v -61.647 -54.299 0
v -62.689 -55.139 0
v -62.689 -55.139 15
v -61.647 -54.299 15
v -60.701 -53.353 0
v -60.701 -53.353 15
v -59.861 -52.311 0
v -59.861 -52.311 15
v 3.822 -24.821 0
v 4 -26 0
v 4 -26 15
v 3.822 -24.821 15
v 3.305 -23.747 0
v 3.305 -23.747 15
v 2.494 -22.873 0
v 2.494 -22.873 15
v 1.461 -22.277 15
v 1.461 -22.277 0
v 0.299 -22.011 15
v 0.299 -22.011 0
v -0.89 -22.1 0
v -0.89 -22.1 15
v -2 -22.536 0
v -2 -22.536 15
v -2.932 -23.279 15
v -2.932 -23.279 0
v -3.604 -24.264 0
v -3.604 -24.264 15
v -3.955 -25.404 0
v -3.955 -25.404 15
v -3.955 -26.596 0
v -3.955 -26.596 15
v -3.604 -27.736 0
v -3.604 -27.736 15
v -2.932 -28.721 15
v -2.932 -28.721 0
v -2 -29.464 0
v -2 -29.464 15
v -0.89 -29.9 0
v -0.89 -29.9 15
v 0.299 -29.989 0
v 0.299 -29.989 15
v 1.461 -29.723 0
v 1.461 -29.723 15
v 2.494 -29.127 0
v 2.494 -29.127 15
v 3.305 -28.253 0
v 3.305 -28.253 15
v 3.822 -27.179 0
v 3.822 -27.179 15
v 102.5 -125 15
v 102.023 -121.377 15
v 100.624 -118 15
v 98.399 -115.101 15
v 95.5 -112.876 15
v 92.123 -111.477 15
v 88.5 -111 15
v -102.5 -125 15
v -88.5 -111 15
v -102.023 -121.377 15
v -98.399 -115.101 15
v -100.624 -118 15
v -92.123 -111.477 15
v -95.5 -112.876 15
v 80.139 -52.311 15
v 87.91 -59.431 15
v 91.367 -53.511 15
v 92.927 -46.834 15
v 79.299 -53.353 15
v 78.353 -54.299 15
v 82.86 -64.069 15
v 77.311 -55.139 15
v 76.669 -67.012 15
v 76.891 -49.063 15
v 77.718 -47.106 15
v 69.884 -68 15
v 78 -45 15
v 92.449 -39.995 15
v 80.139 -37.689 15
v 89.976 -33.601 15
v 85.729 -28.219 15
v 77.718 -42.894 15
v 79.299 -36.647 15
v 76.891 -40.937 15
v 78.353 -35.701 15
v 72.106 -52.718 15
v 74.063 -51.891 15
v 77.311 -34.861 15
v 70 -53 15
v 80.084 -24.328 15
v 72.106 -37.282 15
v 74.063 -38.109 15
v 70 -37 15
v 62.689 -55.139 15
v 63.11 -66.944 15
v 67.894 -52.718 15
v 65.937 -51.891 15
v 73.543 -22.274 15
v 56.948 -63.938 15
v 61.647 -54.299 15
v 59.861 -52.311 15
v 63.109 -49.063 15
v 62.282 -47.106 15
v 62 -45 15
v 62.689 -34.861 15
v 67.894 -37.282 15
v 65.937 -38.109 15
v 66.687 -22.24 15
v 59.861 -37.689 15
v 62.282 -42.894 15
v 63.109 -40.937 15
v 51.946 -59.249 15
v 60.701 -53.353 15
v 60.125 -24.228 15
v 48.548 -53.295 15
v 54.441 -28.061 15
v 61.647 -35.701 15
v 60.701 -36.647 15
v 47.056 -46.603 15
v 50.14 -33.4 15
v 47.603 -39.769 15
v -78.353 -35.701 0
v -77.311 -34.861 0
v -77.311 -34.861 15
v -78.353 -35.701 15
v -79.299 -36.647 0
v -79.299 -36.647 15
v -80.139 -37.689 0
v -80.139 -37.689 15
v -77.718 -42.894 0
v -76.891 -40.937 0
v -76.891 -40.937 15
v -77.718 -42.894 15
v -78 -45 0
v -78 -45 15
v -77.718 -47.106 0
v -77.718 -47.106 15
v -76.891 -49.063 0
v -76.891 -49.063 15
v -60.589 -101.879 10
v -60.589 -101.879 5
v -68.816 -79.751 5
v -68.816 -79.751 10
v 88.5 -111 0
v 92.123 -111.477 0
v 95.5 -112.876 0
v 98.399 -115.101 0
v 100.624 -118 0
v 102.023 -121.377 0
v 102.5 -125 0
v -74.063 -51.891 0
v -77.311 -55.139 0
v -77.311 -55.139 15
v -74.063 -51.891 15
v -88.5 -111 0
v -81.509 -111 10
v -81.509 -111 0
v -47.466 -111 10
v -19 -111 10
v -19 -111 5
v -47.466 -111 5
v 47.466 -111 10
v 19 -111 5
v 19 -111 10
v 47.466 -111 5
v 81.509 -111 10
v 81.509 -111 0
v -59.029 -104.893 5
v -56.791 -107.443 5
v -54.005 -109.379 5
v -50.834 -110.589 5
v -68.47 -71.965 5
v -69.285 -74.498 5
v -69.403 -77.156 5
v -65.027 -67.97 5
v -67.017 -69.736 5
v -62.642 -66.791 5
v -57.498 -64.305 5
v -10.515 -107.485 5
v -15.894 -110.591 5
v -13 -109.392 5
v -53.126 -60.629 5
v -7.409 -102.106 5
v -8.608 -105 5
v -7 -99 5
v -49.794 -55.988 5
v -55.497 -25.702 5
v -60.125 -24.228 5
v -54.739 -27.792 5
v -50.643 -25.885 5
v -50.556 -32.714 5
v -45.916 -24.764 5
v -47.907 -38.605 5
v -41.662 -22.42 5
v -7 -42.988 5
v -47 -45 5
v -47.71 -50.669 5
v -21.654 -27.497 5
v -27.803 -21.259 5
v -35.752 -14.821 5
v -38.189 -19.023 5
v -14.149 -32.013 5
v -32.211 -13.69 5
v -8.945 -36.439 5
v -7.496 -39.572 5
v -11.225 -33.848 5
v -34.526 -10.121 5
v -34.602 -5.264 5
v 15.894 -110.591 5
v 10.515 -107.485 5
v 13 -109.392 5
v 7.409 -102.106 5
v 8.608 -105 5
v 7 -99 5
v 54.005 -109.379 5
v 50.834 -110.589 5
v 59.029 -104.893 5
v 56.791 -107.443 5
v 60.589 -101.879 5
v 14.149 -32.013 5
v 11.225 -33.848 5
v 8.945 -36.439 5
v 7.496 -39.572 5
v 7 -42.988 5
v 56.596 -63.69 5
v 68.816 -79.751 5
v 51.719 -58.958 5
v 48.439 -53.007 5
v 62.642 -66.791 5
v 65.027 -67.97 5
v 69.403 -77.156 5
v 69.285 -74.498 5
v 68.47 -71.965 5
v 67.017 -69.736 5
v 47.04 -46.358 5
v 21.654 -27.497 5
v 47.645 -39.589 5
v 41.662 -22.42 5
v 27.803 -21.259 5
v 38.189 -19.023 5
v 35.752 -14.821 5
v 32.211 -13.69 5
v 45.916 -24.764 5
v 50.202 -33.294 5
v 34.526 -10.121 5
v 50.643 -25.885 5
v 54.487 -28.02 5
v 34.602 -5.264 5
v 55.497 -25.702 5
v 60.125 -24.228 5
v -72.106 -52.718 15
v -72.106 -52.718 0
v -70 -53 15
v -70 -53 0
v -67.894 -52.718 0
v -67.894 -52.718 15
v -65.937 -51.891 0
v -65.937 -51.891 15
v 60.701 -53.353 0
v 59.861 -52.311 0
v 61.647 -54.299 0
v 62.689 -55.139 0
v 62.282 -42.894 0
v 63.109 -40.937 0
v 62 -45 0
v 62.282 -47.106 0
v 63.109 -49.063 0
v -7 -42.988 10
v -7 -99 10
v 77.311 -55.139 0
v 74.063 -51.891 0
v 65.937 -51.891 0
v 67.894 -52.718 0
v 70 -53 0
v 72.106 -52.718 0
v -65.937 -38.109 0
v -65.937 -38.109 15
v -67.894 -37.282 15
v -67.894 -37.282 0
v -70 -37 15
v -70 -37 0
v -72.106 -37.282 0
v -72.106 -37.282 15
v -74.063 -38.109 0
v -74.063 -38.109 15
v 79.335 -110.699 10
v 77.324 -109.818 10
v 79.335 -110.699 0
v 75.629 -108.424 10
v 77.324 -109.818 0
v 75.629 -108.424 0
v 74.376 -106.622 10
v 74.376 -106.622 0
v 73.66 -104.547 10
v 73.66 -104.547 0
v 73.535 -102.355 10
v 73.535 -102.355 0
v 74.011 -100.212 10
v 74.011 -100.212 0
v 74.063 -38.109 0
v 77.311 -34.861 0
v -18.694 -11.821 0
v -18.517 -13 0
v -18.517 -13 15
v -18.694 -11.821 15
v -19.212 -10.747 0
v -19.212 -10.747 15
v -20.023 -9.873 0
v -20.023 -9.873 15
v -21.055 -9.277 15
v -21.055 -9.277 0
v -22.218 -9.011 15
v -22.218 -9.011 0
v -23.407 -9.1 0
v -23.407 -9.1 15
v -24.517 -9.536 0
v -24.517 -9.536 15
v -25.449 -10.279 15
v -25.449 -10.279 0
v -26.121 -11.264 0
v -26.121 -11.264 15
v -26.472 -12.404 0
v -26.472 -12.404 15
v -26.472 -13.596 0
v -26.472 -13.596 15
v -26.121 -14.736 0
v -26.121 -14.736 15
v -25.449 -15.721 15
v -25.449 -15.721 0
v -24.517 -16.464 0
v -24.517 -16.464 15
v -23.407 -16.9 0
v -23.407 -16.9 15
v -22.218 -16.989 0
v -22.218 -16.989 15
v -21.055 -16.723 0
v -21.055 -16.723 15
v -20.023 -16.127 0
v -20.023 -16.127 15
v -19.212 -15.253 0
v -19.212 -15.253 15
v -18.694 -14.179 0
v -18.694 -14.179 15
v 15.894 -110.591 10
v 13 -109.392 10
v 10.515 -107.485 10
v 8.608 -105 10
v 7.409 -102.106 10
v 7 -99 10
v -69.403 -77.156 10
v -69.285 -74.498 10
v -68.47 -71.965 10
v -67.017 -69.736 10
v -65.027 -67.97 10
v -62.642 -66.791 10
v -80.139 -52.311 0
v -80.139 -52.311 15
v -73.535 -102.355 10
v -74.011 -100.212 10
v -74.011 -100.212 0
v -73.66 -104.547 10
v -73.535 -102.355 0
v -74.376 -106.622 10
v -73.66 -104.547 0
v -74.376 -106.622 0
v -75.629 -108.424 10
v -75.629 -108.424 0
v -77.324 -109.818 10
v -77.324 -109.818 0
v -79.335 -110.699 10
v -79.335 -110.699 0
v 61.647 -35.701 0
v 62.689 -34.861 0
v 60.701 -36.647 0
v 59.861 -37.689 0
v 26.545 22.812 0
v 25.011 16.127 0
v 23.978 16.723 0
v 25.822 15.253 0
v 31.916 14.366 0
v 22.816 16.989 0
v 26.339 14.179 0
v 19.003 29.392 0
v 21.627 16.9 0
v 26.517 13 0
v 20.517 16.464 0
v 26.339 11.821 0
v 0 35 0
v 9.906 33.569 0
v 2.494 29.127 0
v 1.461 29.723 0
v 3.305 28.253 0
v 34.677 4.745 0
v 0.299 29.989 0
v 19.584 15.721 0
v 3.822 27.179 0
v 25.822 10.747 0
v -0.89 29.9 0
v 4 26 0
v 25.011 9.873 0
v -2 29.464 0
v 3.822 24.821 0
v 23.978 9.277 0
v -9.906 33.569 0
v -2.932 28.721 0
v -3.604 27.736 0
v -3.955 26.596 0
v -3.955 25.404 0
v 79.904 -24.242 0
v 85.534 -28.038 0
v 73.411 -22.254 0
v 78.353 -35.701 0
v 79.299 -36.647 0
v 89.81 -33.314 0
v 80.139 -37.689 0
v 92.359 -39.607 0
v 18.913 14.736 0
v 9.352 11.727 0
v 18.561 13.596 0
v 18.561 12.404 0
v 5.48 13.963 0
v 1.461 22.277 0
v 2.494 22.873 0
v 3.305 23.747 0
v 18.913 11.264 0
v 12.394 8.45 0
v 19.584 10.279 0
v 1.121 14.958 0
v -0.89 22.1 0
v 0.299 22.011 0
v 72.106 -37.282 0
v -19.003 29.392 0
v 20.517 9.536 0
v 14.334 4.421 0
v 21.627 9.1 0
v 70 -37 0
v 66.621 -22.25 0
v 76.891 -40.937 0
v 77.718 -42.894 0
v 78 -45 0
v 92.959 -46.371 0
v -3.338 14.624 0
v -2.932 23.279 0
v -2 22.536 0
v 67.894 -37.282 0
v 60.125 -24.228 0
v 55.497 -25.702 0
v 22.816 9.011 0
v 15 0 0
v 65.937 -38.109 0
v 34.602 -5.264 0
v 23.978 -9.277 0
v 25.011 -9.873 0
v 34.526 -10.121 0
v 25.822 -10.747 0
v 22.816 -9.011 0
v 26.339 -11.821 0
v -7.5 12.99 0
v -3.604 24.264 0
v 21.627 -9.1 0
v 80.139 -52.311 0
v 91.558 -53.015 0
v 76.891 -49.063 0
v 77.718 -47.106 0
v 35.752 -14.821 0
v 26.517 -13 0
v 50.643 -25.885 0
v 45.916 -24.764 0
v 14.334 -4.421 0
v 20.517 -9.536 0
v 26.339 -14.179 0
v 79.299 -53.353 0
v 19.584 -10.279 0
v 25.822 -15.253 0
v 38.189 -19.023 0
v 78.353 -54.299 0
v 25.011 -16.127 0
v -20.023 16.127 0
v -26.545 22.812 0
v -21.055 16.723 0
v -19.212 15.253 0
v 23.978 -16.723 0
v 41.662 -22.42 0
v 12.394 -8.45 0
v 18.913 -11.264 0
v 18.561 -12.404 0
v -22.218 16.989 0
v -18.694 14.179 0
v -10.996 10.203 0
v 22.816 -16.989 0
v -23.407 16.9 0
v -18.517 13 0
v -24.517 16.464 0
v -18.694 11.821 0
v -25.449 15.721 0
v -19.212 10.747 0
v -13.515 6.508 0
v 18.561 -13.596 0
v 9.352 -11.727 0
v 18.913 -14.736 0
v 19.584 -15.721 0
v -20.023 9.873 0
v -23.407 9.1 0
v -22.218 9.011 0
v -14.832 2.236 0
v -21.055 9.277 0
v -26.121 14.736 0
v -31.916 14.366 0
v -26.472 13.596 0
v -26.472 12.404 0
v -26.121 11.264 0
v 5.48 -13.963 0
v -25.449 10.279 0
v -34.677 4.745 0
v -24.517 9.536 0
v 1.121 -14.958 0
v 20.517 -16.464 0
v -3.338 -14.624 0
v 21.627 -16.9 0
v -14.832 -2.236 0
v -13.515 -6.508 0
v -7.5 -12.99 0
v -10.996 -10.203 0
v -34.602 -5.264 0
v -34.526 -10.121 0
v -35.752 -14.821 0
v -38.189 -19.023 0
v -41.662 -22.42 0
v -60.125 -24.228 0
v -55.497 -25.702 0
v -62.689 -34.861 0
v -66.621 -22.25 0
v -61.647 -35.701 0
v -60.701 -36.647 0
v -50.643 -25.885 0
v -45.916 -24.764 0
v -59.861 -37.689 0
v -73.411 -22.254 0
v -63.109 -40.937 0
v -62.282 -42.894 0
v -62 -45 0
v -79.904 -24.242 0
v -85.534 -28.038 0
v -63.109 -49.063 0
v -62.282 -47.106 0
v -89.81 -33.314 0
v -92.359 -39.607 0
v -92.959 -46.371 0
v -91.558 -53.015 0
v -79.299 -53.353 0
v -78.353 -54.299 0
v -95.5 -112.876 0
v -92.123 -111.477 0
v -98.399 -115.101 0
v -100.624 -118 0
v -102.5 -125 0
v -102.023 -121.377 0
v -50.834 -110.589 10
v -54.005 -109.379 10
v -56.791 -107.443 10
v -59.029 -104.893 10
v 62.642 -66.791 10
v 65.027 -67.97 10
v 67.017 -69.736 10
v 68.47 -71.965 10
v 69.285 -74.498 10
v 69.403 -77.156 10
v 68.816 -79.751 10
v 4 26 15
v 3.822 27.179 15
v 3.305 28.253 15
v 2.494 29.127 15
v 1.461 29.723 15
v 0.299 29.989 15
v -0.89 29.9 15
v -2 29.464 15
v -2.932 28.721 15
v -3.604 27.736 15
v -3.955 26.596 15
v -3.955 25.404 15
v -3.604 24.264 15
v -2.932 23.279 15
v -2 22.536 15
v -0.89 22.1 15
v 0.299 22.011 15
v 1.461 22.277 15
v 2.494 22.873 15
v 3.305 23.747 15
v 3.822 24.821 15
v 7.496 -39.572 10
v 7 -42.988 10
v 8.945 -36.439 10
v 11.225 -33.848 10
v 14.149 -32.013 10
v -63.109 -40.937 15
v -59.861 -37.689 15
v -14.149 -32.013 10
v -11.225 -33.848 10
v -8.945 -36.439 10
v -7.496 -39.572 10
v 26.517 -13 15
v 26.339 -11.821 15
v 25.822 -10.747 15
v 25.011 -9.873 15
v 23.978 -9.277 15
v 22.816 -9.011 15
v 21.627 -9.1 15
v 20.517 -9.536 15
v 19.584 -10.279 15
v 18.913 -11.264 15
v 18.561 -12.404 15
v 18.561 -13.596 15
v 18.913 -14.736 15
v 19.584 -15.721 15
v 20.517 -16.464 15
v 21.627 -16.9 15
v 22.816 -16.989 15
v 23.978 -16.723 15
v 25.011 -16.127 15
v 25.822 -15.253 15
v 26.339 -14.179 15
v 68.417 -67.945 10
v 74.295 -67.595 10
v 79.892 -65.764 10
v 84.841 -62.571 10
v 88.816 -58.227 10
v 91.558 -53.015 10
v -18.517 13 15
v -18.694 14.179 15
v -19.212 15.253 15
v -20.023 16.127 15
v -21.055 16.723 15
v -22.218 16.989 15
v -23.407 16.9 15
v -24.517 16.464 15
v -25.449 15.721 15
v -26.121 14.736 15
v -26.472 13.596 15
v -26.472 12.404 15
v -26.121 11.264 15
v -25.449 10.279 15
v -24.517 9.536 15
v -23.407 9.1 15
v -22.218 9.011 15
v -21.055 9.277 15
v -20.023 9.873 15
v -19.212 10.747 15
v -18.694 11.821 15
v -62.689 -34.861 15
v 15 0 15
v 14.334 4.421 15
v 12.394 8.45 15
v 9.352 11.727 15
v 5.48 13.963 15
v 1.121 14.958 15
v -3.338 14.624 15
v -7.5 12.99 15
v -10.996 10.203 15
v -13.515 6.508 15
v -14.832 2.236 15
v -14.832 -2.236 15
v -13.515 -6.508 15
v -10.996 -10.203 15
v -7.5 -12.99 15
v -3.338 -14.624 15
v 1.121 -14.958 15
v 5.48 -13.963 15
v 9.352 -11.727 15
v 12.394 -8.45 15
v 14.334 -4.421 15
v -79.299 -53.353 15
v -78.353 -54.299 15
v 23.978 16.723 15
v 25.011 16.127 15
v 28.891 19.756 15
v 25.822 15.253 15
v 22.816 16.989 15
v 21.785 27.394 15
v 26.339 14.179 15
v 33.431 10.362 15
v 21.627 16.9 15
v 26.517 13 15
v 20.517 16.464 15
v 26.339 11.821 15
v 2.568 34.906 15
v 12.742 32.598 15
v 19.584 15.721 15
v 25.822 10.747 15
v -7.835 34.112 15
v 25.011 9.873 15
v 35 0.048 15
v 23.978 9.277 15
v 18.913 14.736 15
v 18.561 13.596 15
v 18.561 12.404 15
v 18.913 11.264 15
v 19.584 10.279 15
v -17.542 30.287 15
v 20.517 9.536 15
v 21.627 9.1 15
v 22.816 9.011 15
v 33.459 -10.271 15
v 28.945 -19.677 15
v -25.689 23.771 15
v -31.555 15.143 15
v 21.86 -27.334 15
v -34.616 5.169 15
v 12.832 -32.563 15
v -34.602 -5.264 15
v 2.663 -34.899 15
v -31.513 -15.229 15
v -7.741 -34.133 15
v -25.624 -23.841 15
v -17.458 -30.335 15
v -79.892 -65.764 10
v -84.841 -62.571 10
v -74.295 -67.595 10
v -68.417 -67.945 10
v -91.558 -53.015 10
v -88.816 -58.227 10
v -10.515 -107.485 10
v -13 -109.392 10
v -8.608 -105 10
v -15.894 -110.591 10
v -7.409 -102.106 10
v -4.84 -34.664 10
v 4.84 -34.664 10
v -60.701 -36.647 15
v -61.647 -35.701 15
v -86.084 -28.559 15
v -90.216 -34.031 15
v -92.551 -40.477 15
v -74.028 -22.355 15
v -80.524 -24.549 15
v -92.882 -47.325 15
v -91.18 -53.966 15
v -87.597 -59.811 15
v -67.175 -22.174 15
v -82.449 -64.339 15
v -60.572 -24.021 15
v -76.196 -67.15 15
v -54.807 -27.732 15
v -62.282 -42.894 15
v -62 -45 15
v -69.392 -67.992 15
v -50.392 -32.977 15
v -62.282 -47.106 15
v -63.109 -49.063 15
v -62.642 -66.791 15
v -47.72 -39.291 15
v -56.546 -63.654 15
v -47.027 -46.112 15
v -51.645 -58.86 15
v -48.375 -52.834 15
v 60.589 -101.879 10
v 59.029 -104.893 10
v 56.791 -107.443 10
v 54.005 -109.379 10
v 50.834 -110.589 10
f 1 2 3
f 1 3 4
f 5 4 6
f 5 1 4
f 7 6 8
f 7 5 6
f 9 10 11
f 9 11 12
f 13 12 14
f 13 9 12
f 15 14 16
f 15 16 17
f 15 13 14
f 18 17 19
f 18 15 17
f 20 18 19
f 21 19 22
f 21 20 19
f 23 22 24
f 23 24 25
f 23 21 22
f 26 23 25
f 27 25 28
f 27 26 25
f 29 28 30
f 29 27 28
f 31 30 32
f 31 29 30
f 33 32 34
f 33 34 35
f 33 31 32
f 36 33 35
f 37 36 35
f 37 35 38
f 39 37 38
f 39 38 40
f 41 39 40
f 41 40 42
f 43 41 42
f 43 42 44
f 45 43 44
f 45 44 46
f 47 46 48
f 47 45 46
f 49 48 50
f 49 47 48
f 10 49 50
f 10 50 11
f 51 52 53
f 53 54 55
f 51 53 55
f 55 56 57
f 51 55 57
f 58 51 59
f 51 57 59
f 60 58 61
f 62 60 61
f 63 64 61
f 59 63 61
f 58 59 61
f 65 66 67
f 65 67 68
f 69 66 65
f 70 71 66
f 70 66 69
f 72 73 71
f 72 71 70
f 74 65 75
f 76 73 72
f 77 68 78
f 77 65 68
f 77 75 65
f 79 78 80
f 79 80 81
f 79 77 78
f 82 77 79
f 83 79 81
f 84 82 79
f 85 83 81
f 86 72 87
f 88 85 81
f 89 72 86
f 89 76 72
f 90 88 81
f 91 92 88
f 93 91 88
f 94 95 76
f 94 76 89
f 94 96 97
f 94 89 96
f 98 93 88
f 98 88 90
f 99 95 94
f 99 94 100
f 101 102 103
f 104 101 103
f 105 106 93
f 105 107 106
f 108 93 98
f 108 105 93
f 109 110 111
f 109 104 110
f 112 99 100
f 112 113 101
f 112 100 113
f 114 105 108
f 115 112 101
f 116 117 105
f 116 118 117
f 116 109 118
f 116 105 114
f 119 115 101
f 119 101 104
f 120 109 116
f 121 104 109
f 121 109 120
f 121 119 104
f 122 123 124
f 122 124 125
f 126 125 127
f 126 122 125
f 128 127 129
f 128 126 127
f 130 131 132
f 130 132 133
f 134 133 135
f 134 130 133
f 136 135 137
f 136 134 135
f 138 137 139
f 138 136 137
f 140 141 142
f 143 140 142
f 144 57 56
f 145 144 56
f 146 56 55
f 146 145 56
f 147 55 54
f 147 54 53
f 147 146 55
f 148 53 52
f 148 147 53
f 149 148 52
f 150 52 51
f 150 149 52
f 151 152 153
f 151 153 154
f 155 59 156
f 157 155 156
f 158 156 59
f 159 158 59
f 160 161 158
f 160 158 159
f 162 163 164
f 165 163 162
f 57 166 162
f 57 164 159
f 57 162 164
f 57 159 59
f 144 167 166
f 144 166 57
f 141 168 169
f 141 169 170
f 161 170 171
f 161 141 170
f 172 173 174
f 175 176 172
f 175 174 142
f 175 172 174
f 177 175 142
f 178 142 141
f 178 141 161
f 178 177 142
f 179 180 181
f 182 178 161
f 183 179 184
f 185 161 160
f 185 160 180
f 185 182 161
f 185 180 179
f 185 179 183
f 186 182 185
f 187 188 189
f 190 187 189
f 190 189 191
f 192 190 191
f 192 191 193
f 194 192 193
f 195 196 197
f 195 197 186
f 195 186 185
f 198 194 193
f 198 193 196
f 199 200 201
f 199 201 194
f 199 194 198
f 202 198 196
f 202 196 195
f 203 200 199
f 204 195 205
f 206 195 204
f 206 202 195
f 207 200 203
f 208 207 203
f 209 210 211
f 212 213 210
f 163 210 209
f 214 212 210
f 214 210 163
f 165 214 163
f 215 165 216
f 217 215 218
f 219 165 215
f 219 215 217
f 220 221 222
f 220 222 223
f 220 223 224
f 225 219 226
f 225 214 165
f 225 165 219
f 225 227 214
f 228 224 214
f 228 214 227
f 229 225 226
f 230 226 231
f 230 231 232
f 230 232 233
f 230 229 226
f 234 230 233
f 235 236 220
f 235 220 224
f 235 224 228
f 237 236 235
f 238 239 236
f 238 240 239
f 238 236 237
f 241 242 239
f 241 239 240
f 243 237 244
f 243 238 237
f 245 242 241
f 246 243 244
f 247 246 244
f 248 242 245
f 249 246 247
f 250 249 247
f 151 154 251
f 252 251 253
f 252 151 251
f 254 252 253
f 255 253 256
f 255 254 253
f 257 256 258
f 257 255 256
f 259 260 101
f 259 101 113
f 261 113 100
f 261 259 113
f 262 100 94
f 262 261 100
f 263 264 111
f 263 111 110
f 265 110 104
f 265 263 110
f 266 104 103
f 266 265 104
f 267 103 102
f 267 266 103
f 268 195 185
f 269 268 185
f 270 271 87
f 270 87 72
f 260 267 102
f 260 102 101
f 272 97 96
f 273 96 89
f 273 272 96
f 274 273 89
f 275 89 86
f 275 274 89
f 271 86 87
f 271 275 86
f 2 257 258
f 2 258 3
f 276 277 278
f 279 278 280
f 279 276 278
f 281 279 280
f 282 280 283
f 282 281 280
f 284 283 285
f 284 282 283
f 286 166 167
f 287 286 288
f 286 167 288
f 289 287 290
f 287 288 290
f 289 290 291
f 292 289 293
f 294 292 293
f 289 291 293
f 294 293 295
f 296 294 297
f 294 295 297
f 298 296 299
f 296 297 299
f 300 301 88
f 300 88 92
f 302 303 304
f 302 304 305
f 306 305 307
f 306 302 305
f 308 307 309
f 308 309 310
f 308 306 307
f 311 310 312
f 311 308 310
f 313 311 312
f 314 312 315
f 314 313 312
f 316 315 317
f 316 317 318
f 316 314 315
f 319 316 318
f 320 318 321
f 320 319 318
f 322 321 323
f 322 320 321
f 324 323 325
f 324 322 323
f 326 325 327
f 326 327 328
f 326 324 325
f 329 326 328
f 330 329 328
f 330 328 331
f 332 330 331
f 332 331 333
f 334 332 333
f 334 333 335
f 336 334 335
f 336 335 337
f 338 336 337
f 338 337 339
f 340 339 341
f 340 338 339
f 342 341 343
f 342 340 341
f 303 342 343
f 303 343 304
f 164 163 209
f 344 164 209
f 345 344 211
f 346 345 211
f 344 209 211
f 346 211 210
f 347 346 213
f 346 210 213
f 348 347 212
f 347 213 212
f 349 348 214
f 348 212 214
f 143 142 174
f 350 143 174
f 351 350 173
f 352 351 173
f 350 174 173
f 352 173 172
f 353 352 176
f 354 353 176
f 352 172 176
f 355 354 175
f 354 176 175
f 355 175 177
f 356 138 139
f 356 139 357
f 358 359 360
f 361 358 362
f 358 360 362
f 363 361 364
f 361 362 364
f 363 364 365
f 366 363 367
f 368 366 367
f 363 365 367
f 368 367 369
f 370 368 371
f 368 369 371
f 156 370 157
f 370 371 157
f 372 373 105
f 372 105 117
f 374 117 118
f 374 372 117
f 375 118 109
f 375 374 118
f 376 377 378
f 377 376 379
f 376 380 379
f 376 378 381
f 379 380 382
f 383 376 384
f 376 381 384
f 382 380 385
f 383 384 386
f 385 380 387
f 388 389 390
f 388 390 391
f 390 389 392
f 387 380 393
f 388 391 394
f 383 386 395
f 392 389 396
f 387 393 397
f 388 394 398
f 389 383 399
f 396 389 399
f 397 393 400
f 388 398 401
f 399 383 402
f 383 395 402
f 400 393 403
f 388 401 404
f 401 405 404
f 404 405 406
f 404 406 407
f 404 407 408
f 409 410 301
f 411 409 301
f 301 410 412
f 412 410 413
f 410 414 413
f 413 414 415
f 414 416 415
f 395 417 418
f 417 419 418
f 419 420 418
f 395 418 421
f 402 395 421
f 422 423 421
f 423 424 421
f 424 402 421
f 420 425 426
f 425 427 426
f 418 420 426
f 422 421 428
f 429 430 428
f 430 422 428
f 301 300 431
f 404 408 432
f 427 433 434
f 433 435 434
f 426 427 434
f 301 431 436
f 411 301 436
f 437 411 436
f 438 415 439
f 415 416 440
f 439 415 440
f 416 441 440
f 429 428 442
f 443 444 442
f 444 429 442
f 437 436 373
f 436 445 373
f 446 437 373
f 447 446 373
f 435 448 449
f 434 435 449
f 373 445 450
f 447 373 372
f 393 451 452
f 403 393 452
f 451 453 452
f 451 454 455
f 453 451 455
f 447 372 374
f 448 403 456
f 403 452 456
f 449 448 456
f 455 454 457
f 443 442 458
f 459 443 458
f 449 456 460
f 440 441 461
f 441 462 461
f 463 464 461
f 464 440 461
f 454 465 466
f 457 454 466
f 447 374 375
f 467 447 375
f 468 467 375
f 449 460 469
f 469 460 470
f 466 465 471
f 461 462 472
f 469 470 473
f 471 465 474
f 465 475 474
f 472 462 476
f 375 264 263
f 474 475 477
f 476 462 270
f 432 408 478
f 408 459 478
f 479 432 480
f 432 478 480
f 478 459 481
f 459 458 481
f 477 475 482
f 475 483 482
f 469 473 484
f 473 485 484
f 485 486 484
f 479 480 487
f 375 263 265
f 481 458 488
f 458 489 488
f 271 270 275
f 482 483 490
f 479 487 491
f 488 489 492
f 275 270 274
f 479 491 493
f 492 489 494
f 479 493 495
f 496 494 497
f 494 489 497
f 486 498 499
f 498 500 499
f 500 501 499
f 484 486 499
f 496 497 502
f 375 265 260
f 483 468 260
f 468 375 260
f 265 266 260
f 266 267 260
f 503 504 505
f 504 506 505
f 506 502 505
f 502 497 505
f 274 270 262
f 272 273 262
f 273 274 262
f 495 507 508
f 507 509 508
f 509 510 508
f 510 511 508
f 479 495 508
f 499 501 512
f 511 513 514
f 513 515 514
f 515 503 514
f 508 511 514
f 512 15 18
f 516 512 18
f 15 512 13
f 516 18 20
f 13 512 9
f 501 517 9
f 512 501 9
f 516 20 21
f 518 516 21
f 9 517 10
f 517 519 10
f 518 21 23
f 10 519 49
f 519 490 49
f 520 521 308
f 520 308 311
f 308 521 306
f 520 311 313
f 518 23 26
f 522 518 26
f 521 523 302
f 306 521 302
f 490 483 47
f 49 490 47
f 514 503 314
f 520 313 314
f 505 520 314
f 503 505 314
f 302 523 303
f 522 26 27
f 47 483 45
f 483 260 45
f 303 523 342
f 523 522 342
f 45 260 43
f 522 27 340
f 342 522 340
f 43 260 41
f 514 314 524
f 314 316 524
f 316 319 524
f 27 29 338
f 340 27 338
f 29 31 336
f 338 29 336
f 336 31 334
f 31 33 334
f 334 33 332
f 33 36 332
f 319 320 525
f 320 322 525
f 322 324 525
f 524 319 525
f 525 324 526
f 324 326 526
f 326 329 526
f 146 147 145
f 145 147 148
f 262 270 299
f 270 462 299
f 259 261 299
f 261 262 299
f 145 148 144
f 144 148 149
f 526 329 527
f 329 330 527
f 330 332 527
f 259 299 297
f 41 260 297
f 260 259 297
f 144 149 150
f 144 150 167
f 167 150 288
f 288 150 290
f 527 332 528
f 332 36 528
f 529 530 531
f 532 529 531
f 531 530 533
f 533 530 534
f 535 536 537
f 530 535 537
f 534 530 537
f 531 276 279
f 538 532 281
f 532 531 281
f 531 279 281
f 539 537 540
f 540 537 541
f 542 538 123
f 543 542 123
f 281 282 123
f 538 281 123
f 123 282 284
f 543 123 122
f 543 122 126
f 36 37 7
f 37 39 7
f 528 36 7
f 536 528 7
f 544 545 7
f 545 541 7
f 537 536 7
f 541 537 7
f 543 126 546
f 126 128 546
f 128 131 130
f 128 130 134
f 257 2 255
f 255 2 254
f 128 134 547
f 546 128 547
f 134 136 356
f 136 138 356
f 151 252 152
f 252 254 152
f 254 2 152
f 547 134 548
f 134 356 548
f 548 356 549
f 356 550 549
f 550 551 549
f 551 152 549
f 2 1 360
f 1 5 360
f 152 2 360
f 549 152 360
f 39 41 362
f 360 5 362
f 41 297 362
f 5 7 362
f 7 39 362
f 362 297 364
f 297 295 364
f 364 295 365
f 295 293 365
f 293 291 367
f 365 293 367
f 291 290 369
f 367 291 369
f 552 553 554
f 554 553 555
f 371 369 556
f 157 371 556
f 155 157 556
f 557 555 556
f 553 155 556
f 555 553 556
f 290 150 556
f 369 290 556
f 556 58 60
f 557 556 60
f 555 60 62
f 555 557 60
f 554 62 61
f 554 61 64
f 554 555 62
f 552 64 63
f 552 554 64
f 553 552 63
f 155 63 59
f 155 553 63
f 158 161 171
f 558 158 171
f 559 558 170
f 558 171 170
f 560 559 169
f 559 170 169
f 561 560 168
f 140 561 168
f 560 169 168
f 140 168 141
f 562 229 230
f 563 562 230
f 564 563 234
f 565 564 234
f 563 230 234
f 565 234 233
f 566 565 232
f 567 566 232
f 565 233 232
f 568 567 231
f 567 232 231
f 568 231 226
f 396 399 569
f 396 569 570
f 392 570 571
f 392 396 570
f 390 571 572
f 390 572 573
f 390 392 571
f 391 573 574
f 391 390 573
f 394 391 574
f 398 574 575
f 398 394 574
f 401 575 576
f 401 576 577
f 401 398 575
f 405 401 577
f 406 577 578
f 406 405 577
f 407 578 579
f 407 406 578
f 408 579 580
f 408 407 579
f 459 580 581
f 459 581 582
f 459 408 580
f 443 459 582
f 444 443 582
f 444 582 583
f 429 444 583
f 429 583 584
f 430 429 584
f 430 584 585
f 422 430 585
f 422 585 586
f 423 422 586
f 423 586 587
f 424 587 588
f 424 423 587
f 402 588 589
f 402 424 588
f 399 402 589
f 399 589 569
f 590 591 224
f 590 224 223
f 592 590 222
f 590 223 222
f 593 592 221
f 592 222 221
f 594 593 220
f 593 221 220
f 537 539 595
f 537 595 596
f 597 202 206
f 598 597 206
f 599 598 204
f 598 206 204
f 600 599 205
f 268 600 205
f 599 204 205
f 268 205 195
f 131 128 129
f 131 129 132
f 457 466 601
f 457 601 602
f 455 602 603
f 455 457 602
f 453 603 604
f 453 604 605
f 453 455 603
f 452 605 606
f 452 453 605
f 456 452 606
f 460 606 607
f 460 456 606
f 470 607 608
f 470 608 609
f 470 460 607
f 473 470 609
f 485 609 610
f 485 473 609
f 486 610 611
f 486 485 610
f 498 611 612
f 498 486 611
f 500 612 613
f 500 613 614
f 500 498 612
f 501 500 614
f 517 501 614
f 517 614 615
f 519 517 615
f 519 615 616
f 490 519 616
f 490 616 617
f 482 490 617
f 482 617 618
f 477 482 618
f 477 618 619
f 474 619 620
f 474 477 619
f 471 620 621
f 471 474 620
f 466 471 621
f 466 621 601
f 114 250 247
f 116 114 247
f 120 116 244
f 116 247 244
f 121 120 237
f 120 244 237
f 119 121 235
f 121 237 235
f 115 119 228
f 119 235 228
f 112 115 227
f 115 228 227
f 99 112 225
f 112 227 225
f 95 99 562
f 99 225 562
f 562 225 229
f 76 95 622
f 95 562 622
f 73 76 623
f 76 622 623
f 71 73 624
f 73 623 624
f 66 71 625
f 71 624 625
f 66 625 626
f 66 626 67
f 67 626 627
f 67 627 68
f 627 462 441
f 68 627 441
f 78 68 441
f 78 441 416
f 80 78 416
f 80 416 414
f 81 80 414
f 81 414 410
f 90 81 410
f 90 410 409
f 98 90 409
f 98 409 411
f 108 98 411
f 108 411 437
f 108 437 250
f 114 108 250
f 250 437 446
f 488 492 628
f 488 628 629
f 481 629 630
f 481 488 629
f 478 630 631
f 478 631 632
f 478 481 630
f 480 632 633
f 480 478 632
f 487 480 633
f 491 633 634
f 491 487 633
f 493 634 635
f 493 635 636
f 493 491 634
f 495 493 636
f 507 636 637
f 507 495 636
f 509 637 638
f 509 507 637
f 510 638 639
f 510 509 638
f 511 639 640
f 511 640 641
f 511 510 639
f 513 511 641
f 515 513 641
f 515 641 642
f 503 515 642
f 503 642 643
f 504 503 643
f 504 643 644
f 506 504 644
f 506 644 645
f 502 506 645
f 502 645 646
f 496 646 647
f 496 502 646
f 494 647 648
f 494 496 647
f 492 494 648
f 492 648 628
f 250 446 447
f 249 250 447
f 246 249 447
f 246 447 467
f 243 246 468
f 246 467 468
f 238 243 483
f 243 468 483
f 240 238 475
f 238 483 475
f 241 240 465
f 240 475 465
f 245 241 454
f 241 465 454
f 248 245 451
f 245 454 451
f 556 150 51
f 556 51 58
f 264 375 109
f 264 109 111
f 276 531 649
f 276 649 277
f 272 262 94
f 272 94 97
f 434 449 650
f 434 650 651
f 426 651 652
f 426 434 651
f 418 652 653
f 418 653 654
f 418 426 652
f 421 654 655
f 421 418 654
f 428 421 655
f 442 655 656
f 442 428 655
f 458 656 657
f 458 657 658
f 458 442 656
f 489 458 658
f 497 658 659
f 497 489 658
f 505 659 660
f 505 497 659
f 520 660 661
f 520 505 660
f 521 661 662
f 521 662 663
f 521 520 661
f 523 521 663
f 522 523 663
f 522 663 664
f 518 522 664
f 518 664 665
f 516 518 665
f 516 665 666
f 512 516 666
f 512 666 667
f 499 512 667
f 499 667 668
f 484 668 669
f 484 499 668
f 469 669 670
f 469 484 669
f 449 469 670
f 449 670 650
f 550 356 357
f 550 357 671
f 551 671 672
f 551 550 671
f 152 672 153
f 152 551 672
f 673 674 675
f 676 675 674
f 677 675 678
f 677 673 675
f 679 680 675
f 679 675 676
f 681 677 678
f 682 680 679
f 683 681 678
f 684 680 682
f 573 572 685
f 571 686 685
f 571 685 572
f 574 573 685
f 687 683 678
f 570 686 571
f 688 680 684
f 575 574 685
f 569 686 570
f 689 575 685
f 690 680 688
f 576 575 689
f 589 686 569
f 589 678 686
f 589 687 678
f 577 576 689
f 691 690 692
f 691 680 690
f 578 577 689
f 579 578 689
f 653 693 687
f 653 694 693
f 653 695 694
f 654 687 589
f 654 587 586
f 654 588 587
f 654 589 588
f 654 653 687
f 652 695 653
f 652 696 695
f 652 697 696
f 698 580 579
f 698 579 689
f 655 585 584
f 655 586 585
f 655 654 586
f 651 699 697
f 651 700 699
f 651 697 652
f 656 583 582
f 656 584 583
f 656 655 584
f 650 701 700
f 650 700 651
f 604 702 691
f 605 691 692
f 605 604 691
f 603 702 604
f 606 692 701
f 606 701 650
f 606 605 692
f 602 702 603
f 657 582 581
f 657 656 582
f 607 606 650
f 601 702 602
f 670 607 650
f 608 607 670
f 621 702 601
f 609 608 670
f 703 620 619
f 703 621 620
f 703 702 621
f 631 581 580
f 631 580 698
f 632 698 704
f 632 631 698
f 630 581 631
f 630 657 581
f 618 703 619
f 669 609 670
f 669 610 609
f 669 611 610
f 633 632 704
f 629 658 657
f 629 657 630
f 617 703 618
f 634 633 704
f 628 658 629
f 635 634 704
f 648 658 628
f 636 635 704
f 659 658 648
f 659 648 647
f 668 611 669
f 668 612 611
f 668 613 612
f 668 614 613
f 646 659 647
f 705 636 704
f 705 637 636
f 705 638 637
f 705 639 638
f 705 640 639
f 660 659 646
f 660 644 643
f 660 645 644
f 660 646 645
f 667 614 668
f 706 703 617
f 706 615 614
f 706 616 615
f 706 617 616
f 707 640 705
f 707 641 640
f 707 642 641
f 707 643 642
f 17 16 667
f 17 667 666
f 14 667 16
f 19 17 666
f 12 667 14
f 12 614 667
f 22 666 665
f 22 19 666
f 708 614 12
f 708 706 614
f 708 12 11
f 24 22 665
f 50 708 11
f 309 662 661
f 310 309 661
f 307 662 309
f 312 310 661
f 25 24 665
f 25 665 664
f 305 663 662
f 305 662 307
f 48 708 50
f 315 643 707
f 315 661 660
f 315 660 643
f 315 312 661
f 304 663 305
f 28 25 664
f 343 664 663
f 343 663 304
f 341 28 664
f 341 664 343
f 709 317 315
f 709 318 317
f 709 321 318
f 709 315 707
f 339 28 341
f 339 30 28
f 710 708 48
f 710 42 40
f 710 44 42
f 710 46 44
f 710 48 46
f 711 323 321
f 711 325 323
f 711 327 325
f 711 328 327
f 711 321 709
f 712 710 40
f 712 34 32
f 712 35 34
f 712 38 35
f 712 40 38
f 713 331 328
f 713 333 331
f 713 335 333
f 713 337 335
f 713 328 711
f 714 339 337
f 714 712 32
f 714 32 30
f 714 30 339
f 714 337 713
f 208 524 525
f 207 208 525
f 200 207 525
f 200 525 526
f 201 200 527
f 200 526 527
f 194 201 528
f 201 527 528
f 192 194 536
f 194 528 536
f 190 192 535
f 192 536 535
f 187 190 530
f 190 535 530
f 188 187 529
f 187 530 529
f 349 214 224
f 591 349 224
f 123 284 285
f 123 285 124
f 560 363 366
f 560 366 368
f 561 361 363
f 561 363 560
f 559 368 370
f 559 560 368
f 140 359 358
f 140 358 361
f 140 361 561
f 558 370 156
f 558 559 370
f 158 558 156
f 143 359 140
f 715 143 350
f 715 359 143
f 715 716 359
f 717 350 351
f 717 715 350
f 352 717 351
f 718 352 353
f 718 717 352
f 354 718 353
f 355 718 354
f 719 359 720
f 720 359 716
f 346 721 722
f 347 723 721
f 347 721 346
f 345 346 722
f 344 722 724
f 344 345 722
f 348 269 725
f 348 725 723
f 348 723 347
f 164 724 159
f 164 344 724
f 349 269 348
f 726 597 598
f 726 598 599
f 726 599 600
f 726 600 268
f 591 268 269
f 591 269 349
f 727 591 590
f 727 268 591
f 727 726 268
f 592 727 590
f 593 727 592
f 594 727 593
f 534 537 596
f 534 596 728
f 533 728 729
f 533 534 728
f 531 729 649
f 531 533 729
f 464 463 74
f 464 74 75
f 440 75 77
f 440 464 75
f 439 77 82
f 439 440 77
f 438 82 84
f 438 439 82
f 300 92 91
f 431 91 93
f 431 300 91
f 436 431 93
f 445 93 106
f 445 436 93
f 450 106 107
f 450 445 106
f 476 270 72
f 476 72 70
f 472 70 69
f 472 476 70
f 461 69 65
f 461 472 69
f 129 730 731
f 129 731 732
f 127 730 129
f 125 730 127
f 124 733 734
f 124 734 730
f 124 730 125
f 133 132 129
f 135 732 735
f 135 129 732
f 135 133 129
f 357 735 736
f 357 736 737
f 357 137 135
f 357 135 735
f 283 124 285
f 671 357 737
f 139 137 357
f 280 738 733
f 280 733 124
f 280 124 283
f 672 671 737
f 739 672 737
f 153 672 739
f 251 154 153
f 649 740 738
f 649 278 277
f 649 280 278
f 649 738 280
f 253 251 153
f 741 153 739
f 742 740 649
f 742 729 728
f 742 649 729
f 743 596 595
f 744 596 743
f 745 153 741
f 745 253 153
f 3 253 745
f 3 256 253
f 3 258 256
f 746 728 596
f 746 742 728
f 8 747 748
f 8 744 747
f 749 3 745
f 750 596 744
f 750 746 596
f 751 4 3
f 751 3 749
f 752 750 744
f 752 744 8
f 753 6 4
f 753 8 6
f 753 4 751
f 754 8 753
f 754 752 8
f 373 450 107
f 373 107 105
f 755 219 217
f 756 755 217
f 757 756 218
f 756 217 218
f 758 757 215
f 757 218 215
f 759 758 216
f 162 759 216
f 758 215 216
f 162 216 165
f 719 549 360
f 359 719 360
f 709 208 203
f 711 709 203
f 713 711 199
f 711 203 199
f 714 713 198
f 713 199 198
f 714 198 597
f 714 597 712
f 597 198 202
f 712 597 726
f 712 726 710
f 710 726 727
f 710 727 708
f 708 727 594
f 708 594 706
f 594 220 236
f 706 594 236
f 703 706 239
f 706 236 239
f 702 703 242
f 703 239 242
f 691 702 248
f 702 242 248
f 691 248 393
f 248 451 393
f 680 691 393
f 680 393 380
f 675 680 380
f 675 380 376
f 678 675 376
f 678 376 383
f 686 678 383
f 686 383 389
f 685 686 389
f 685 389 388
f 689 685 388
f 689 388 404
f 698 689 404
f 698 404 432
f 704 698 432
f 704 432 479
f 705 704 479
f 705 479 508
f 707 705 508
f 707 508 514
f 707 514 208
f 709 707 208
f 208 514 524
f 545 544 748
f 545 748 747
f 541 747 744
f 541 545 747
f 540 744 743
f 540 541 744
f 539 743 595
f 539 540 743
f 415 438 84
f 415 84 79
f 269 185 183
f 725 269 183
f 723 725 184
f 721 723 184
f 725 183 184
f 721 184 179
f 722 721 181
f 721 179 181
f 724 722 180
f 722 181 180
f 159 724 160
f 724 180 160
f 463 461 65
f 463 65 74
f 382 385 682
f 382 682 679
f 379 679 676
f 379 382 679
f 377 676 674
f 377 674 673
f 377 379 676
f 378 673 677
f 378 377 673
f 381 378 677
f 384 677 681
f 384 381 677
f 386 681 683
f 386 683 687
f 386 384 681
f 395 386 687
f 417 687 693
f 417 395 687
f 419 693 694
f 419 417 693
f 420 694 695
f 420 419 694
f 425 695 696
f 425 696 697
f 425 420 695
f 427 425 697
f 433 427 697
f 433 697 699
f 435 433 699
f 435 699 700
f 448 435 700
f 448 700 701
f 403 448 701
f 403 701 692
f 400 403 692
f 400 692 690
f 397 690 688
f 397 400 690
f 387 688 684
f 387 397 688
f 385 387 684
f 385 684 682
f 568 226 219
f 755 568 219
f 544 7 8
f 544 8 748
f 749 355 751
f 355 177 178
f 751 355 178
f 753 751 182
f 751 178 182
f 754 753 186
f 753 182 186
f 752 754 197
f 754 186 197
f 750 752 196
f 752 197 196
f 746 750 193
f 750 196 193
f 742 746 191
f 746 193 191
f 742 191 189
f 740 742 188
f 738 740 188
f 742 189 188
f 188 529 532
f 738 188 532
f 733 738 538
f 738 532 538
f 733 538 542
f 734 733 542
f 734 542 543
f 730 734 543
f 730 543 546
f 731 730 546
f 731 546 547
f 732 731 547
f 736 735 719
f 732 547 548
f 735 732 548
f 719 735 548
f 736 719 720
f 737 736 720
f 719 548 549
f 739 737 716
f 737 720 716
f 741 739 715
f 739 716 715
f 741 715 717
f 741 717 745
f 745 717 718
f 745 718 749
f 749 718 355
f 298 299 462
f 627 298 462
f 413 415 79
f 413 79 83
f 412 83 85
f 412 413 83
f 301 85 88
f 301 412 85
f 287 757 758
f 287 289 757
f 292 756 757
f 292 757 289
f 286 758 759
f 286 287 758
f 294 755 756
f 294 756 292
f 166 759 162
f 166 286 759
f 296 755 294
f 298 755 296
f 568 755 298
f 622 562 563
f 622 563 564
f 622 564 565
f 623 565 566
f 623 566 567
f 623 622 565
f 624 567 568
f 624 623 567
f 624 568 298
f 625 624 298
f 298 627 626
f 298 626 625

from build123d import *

# Parameters (mm, degrees)
EXTRUDE_1_DEPTH   = 5
EXTRUDE_1_2_DEPTH = 5
SKETCH_1_3_R      = 35
SKETCH_1_3_R_2    = 4
SKETCH_1_3_R_3    = 15
SKETCH_1_3_R_4    = 23
EXTRUDE_2_DEPTH   = 15
EXTRUDE_3_DEPTH   = 10


with BuildPart() as part:
    # Эскиз1 → Бобышка-Вытянуть1 (new body)
    with BuildSketch(Plane.XY):
        with BuildLine():
            Line((-7, -99), (-7, -42.98837052))
            ThreePointArc((-7, -42.98837052), (-8.944833021, -36.439048645), (-14.14893617, -32.012616345))
            ThreePointArc((-14.14893617, -32.012616345), (-27.803487019, -21.259494575), (-34.601893463, -5.263930923))
            ThreePointArc((-34.601893463, -5.263930923), (-41.662021509, -22.419519283), (-60.125232147, -24.227687662))
            ThreePointArc((-60.125232147, -24.227687662), (-47.040096479, -46.357508857), (-62.641809124, -66.791214446))
            ThreePointArc((-62.641809124, -66.791214446), (-68.470432654, -71.964706785), (-68.815739838, -79.750503994))
            Line((-68.815739838, -79.750503994), (-60.588648114, -101.878787879))
            ThreePointArc((-60.588648114, -101.878787879), (-55.456771013, -108.495717253), (-47.466246321, -111))
            Line((-47.466246321, -111), (-19, -111))
            ThreePointArc((-19, -111), (-10.514718626, -107.485281374), (-7, -99))
        make_face()
    extrude(amount=EXTRUDE_1_DEPTH)



with BuildPart() as body_2:
    # Эскиз1 → Extrude 1 2 (new body)
    with BuildSketch(Plane.XY):
        with BuildLine():
            ThreePointArc((34.601893463, -5.263930923), (27.803487019, -21.259494575), (14.14893617, -32.012616345))
            ThreePointArc((14.14893617, -32.012616345), (8.944833021, -36.439048645), (7, -42.98837052))
            Line((7, -42.98837052), (7, -99))
            ThreePointArc((7, -99), (10.514718626, -107.485281374), (19, -111))
            Line((19, -111), (47.466246321, -111))
            ThreePointArc((47.466246321, -111), (55.456771013, -108.495717253), (60.588648114, -101.878787879))
            Line((60.588648114, -101.878787879), (68.815739838, -79.750503994))
            ThreePointArc((68.815739838, -79.750503994), (68.470432654, -71.964706785), (62.641809124, -66.791214446))
            ThreePointArc((62.641809124, -66.791214446), (47.040096479, -46.357508857), (60.125232147, -24.227687662))
            ThreePointArc((60.125232147, -24.227687662), (41.662021509, -22.419519283), (34.601893463, -5.263930923))
        make_face()
    extrude(amount=EXTRUDE_1_2_DEPTH)


with BuildPart() as part_1:
    add(part.part)

    add(body_2.part)  # Бобышка-Вытянуть2 merges body 2
    # Эскиз1<3> → Бобышка-Вытянуть2 (add)
    # profile 1 of 4: a face of its own
    with BuildSketch(Plane.XY):
        Circle(SKETCH_1_3_R)
        with Locations((0, -26)):
            Circle(SKETCH_1_3_R_2, mode=Mode.SUBTRACT)
        with Locations((-22.516660498, -13)):
            Circle(SKETCH_1_3_R_2, mode=Mode.SUBTRACT)
        Circle(SKETCH_1_3_R_3, mode=Mode.SUBTRACT)
        with Locations((-22.516660498, 13)):
            Circle(SKETCH_1_3_R_2, mode=Mode.SUBTRACT)
        with Locations((0, 26)):
            Circle(SKETCH_1_3_R_2, mode=Mode.SUBTRACT)
        with Locations((22.516660498, -13)):
            Circle(SKETCH_1_3_R_2, mode=Mode.SUBTRACT)
        with Locations((22.516660498, 13)):
            Circle(SKETCH_1_3_R_2, mode=Mode.SUBTRACT)
    # profile 2 of 4: a face of its own
    with BuildSketch(Plane.XY):
        with BuildLine():
            Line((88.5, -111), (-88.5, -111))
            ThreePointArc((-88.5, -111), (-98.399494937, -115.100505063), (-102.5, -125))
            Line((-102.5, -125), (102.5, -125))
            ThreePointArc((102.5, -125), (98.399494937, -115.100505063), (88.5, -111))
        make_face()
    # profile 3 of 4: a face of its own
    with BuildSketch(Plane.XY):
        with Locations((-70, -45)):
            Circle(SKETCH_1_3_R_4)
        with BuildLine():
            ThreePointArc((-59.860822254, -52.310750621), (-61.161165235, -53.838834765), (-62.689249379, -55.139177746))
            Line((-62.689249379, -55.139177746), (-65.936987987, -51.891439137))
            ThreePointArc((-65.936987987, -51.891439137), (-70, -53), (-74.063012013, -51.891439137))
            Line((-74.063012013, -51.891439137), (-77.310750621, -55.139177746))
            ThreePointArc((-77.310750621, -55.139177746), (-78.838834765, -53.838834765), (-80.139177746, -52.310750621))
            Line((-80.139177746, -52.310750621), (-76.891439137, -49.063012013))
            ThreePointArc((-76.891439137, -49.063012013), (-78, -45), (-76.891439137, -40.936987987))
            Line((-76.891439137, -40.936987987), (-80.139177746, -37.689249379))
            ThreePointArc((-80.139177746, -37.689249379), (-78.838834765, -36.161165235), (-77.310750621, -34.860822254))
            Line((-77.310750621, -34.860822254), (-74.063012013, -38.108560863))
            ThreePointArc((-74.063012013, -38.108560863), (-70, -37), (-65.936987987, -38.108560863))
            Line((-65.936987987, -38.108560863), (-62.689249379, -34.860822254))
            ThreePointArc((-62.689249379, -34.860822254), (-61.161165235, -36.161165235), (-59.860822254, -37.689249379))
            Line((-59.860822254, -37.689249379), (-63.108560863, -40.936987987))
            ThreePointArc((-63.108560863, -40.936987987), (-62, -45), (-63.108560863, -49.063012013))
            Line((-63.108560863, -49.063012013), (-59.860822254, -52.310750621))
        make_face(mode=Mode.SUBTRACT)
    # profile 4 of 4: a face of its own
    with BuildSketch(Plane.XY):
        with Locations((70, -45)):
            Circle(SKETCH_1_3_R_4)
        with BuildLine():
            ThreePointArc((59.860822254, -37.689249379), (61.161165235, -36.161165235), (62.689249379, -34.860822254))
            Line((62.689249379, -34.860822254), (65.936987987, -38.108560863))
            ThreePointArc((65.936987987, -38.108560863), (70, -37), (74.063012013, -38.108560863))
            Line((74.063012013, -38.108560863), (77.310750621, -34.860822254))
            ThreePointArc((77.310750621, -34.860822254), (78.838834765, -36.161165235), (80.139177746, -37.689249379))
            Line((80.139177746, -37.689249379), (76.891439137, -40.936987987))
            ThreePointArc((76.891439137, -40.936987987), (78, -45), (76.891439137, -49.063012013))
            Line((76.891439137, -49.063012013), (80.139177746, -52.310750621))
            ThreePointArc((80.139177746, -52.310750621), (78.838834765, -53.838834765), (77.310750621, -55.139177746))
            Line((77.310750621, -55.139177746), (74.063012013, -51.891439137))
            ThreePointArc((74.063012013, -51.891439137), (70, -53), (65.936987987, -51.891439137))
            Line((65.936987987, -51.891439137), (62.689249379, -55.139177746))
            ThreePointArc((62.689249379, -55.139177746), (61.161165235, -53.838834765), (59.860822254, -52.310750621))
            Line((59.860822254, -52.310750621), (63.108560863, -49.063012013))
            ThreePointArc((63.108560863, -49.063012013), (62, -45), (63.108560863, -40.936987987))
            Line((63.108560863, -40.936987987), (59.860822254, -37.689249379))
        make_face(mode=Mode.SUBTRACT)
    extrude(amount=EXTRUDE_2_DEPTH)

    # Эскиз1<4> → Бобышка-Вытянуть3 (add)
    with BuildSketch(Plane.XY):
        with BuildLine():
            ThreePointArc((-14.14893617, -32.012616345), (-8.944833021, -36.439048645), (-7, -42.98837052))
            Line((-7, -42.98837052), (-7, -99))
            ThreePointArc((-7, -99), (-10.514718626, -107.485281374), (-19, -111))
            Line((-19, -111), (19, -111))
            ThreePointArc((19, -111), (10.514718626, -107.485281374), (7, -99))
            Line((7, -99), (7, -42.98837052))
            ThreePointArc((7, -42.98837052), (8.944833021, -36.439048645), (14.14893617, -32.012616345))
            ThreePointArc((14.14893617, -32.012616345), (0, -35), (-14.14893617, -32.012616345))
        make_face()
        with BuildLine():
            Line((-81.509349081, -111), (-47.466246321, -111))
            ThreePointArc((-47.466246321, -111), (-55.456771013, -108.495717253), (-60.588648114, -101.878787879))
            Line((-60.588648114, -101.878787879), (-68.815739838, -79.750503994))
            ThreePointArc((-68.815739838, -79.750503994), (-68.470432654, -71.964706785), (-62.641809124, -66.791214446))
            ThreePointArc((-62.641809124, -66.791214446), (-79.892182066, -65.764024994), (-91.558231518, -53.015151515))
            Line((-91.558231518, -53.015151515), (-74.010833771, -100.212121212))
            ThreePointArc((-74.010833771, -100.212121212), (-74.940367794, -107.56601411), (-81.509349081, -111))
        make_face()
        with BuildLine():
            ThreePointArc((60.588648114, -101.878787879), (55.456771013, -108.495717253), (47.466246321, -111))
            Line((47.466246321, -111), (81.509349081, -111))
            ThreePointArc((81.509349081, -111), (74.940367794, -107.56601411), (74.010833771, -100.212121212))
            Line((74.010833771, -100.212121212), (91.558231518, -53.015151515))
            ThreePointArc((91.558231518, -53.015151515), (79.892182066, -65.764024994), (62.641809124, -66.791214446))
            ThreePointArc((62.641809124, -66.791214446), (68.470432654, -71.964706785), (68.815739838, -79.750503994))
            Line((68.815739838, -79.750503994), (60.588648114, -101.878787879))
        make_face()
    extrude(amount=EXTRUDE_3_DEPTH)


solid = part_1.part
